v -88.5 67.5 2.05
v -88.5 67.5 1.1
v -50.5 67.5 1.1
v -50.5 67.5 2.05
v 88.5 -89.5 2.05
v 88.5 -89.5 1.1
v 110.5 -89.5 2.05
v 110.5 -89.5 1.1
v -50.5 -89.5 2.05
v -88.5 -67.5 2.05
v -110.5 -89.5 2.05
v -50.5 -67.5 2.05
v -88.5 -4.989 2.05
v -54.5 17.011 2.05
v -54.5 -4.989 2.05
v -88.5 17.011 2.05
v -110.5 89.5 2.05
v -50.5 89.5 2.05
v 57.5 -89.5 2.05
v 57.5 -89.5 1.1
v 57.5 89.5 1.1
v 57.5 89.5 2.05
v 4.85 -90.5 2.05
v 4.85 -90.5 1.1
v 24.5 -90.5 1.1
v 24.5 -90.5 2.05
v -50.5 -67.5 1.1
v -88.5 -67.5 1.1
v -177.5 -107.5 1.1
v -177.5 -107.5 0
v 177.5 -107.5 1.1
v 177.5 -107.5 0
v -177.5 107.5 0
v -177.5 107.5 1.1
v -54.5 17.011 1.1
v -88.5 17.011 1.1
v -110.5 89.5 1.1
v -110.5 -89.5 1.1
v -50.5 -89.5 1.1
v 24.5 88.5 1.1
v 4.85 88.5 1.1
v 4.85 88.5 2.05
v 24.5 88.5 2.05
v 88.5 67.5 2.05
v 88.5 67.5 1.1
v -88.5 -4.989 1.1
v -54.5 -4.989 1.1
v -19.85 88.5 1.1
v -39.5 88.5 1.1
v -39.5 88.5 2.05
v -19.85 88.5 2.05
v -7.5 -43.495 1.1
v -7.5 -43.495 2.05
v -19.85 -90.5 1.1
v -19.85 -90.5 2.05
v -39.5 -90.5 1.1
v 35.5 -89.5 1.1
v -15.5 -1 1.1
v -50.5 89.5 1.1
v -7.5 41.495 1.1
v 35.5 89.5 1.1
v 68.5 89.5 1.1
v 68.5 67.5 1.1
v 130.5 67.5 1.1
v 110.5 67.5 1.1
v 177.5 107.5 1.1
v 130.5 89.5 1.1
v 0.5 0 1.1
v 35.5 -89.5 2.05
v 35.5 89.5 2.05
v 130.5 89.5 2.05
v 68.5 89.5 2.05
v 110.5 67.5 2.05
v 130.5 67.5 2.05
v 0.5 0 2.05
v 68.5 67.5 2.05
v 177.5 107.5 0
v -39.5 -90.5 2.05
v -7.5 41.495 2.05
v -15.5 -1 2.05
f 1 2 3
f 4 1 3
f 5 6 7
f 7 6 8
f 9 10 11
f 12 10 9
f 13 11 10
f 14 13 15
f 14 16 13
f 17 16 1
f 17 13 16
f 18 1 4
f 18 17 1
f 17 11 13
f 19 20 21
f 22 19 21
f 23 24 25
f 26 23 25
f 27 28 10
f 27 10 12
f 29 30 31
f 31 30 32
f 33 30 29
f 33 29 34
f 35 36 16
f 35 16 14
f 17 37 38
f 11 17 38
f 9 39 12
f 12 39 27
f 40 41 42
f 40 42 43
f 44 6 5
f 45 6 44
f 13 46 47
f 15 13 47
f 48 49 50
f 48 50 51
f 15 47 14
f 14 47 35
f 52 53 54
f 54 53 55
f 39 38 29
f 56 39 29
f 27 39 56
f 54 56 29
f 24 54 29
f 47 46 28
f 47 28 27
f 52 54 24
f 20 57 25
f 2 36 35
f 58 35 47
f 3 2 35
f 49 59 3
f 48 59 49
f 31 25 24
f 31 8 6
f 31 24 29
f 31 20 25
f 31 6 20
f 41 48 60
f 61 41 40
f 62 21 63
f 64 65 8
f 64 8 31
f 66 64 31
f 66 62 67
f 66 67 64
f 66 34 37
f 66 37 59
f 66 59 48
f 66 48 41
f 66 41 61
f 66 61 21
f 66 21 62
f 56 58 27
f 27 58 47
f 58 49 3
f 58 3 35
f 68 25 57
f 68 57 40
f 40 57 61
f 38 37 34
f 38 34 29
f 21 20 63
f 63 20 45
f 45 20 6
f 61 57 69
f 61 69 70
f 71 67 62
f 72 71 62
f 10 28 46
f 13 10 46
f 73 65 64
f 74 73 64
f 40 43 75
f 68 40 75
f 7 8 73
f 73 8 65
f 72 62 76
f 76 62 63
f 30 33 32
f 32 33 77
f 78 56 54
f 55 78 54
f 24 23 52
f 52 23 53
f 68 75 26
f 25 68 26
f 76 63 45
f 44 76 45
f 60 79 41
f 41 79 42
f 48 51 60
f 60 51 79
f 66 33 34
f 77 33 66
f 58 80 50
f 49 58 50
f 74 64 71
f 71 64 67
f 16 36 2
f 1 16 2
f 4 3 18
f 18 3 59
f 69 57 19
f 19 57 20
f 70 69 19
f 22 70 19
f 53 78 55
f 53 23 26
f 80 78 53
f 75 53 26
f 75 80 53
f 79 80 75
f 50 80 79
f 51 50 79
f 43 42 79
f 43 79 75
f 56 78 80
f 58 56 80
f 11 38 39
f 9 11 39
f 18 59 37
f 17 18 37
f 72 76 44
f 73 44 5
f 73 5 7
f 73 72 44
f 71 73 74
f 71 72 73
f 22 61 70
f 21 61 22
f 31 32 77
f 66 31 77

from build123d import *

# Parameters (mm, degrees)
F0_W      = 355
F0_H      = 215
F1_DEPTH  = 1.1
F2_W      = 38
F2_H      = 22
F2_W_2    = 34
F3_DEPTH  = 0.95
F4_W      = 22
F4_H      = 157
F5_DEPTH  = 0.95
F6_W      = 22
F6_H      = 179
F7_DEPTH  = 0.95
F8_W      = 64
F8_H      = 179
F9_DEPTH  = 0.95
F11_DEPTH = 0.95
F13_DEPTH = 0.95
F15_DEPTH = 0.95
F17_DEPTH = 0.95


with BuildPart() as f1:
    # F0 (on Top) → F1 (new body)
    with BuildSketch(Plane.XY):
        Rectangle(F0_W, F0_H)
    extrude(amount=F1_DEPTH)

    # F2 (on face) → F3 (join)
    with BuildSketch(Plane.XY.offset(1.1)):
        Polygon((-88.5, 89.5), (-110.5, 89.5), (-110.5, -89.5), (-88.5, -89.5), (-88.5, -67.5), (-88.5, -4.988748), (-88.5, 17.011252), (-88.5, 67.5), align=None)
        with Locations((-69.5, 78.5)):
            Rectangle(F2_W, F2_H)
        with Locations((-69.5, -78.5)):
            Rectangle(F2_W, F2_H)
        with Locations((-71.5, 6.011252)):
            Rectangle(F2_W_2, F2_H)
    extrude(amount=F3_DEPTH)

    # F4 (on face) → F5 (join)
    with BuildSketch(Plane.XY.offset(1.1)):
        Polygon((130.5, 89.5), (68.5, 89.5), (68.5, 67.5), (88.5, 67.5), (110.5, 67.5), (130.5, 67.5), align=None)
        with Locations((99.5, -11)):
            Rectangle(F4_W, F4_H)
    extrude(amount=F5_DEPTH)

    # F6 (on face) → F7 (join)
    with BuildSketch(Plane.XY.offset(1.1)):
        with Locations((46.5, 0)):
            Rectangle(F6_W, F6_H)
    extrude(amount=F7_DEPTH)

    # F8 (on face) → F9 (join)
    with BuildSketch(Plane.XY.offset(1.1)):
        with Locations((-7.5, -1)):
            Rectangle(F8_W, F8_H)
    extrude(amount=F9_DEPTH)

    # F10 (on face) → F11 (cut)
    with BuildSketch(Plane.XY.offset(2.05)):
        Polygon((-15.5, -1), (-39.5, 88.5), (-39.5, -90.5), align=None)
    extrude(amount=-F11_DEPTH, mode=Mode.SUBTRACT)

    # F12 (on face) → F13 (cut)
    with BuildSketch(Plane.XY.offset(2.05)):
        Polygon((24.5, -90.5), (24.5, 88.5), (0.5, 0), align=None)
    extrude(amount=-F13_DEPTH, mode=Mode.SUBTRACT)

    # F14 (on face) → F15 (cut)
    with BuildSketch(Plane.XY.offset(2.05)):
        Polygon((-7.5, -43.495346), (-19.85, -90.5), (4.85, -90.5), align=None)
    extrude(amount=-F15_DEPTH, mode=Mode.SUBTRACT)

    # F16 (on face) → F17 (cut)
    with BuildSketch(Plane.XY.offset(2.05)):
        Polygon((4.85, 88.5), (-19.85, 88.5), (-7.5, 41.495346), align=None)
    extrude(amount=-F17_DEPTH, mode=Mode.SUBTRACT)


solid = f1.part
